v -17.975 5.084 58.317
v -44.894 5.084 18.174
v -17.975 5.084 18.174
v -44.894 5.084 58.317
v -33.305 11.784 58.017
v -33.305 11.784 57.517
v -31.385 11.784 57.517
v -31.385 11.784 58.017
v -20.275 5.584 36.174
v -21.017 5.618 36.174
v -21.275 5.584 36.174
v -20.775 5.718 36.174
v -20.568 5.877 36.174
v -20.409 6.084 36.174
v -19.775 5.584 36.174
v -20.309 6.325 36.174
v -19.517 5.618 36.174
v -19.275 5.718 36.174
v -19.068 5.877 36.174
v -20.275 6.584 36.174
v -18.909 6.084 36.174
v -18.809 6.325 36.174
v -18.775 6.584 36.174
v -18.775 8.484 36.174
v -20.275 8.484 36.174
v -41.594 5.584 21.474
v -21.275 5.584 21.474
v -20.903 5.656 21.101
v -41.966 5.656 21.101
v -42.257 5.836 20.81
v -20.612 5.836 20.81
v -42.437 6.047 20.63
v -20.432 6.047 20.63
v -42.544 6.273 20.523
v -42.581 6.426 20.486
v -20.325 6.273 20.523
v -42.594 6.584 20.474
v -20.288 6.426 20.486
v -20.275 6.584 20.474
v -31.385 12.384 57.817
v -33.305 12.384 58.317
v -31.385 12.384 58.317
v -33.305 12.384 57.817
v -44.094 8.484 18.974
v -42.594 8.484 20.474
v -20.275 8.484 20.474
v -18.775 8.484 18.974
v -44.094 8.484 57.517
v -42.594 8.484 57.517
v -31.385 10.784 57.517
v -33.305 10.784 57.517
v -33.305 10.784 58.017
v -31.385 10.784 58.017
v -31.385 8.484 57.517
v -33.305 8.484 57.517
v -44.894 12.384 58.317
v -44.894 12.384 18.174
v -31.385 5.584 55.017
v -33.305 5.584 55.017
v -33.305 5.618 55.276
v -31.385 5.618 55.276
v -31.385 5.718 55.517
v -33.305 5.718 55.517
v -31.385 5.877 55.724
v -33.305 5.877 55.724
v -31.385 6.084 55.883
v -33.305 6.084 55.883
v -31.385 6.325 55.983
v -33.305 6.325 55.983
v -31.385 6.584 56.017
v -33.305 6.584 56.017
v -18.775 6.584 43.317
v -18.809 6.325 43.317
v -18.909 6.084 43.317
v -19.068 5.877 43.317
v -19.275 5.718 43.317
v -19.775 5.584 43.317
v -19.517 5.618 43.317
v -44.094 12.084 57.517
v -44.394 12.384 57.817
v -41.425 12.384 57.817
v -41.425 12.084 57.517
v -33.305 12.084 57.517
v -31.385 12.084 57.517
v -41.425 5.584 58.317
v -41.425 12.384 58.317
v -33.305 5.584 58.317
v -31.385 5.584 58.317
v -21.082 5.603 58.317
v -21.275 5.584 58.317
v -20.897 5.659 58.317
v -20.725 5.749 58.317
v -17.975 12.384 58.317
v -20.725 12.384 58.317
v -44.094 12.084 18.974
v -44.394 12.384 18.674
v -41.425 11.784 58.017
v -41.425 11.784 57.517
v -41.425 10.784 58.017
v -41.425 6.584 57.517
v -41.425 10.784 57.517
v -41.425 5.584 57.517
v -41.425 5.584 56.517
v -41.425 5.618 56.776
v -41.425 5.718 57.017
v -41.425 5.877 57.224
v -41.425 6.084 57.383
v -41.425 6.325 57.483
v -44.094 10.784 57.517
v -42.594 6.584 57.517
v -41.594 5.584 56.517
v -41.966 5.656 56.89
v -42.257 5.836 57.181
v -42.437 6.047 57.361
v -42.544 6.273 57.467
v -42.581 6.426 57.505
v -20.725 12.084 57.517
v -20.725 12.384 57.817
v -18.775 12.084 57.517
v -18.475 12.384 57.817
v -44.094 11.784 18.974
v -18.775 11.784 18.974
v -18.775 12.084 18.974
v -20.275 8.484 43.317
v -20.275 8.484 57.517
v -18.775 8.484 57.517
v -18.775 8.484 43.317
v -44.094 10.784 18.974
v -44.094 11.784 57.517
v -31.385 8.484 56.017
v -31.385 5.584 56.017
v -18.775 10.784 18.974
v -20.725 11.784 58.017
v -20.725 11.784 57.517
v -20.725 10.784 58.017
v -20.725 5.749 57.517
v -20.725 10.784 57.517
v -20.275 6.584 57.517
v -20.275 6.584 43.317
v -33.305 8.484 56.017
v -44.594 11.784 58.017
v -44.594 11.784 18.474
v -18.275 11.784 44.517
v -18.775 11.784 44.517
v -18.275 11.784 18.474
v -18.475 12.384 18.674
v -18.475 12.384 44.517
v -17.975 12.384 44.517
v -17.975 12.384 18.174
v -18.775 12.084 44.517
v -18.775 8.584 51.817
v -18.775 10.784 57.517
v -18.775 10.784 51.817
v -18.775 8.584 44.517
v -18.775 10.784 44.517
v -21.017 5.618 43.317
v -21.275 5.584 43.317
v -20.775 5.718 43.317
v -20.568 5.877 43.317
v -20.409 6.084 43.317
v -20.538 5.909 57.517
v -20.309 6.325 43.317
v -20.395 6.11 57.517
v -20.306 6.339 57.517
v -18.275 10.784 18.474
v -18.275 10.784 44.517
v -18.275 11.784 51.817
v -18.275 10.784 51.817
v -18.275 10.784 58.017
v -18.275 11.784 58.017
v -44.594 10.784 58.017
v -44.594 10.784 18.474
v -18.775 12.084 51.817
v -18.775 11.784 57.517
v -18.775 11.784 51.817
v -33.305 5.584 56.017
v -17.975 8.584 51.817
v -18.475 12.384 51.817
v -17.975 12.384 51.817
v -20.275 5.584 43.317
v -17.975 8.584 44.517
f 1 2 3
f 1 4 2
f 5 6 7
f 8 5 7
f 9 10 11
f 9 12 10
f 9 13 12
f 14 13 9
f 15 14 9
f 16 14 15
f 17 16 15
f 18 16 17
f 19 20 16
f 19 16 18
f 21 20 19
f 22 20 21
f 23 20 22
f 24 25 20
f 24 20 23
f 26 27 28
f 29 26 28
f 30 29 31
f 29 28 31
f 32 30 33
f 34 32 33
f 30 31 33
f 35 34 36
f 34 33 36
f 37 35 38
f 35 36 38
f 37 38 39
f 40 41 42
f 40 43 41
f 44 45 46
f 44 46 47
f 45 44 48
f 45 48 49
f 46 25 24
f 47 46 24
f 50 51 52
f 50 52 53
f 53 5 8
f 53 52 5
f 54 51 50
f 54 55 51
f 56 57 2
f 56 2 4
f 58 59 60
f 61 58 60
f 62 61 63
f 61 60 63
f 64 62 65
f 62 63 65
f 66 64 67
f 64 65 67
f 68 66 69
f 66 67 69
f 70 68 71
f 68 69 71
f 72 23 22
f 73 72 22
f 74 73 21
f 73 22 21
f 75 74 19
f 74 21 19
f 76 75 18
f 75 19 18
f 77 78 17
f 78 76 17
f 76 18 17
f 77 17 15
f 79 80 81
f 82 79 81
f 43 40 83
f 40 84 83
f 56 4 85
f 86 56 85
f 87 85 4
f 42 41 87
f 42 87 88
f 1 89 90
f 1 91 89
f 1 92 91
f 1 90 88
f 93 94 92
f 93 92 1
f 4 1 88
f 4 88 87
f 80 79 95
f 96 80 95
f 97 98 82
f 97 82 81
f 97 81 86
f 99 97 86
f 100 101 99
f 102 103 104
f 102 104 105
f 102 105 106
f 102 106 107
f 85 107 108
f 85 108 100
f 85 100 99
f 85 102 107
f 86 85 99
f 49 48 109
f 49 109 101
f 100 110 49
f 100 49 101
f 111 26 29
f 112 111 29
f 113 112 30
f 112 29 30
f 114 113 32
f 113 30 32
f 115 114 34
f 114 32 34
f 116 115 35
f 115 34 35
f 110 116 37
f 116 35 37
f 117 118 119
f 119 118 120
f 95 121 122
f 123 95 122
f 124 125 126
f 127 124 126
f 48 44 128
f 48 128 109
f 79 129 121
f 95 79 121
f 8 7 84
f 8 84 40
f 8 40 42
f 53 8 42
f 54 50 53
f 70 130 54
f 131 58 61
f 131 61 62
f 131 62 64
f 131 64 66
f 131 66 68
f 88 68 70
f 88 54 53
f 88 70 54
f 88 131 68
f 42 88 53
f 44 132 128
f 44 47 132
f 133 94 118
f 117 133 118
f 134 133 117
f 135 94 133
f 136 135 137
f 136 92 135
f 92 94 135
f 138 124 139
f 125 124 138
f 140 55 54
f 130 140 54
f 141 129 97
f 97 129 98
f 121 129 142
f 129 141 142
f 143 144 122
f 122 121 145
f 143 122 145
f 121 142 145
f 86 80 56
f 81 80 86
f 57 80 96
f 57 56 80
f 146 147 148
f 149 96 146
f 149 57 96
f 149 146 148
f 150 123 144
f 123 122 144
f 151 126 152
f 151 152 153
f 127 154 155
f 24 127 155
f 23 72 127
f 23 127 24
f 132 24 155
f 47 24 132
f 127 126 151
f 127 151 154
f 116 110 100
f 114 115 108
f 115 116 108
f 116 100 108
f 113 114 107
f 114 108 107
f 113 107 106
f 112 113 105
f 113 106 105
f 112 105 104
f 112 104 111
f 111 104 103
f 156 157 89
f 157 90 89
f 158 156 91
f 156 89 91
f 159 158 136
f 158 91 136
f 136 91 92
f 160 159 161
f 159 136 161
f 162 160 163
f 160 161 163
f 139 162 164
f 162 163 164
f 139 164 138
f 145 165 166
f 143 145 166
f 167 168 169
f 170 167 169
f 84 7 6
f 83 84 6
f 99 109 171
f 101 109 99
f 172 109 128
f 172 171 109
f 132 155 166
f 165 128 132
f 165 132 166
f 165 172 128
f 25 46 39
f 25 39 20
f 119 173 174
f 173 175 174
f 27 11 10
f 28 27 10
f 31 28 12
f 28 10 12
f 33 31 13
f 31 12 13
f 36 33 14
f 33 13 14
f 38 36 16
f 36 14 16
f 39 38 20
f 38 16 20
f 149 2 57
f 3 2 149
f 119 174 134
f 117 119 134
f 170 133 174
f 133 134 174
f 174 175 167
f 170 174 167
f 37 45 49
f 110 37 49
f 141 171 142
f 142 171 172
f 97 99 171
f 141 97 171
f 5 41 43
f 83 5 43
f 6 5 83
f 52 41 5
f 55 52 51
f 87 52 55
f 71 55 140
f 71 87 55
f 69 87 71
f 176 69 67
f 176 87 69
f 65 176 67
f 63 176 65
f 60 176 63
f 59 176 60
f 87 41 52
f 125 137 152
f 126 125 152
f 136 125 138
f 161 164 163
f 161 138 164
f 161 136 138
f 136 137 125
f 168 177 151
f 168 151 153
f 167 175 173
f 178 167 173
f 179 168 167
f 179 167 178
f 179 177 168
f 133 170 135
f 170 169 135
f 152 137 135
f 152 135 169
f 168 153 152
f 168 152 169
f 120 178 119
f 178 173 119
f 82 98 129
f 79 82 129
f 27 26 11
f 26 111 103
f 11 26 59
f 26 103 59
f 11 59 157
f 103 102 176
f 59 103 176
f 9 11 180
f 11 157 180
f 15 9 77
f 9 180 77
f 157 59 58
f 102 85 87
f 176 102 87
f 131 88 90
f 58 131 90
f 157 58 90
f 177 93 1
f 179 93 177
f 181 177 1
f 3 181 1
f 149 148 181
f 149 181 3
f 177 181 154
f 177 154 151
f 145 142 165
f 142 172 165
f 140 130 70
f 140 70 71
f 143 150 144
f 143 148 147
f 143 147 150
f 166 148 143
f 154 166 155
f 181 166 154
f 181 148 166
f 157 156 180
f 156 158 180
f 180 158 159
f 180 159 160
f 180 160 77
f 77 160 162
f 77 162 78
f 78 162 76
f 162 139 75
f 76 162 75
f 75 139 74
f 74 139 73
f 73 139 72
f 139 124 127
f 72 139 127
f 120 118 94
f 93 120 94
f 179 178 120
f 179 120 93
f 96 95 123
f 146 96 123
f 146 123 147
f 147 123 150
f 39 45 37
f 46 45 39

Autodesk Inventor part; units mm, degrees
ref_plane "YZ Plane" through (0, 0, 0) normal (1, 0, 0) x (0, 1, 0)
ref_plane "Work Plane1" through (-26.0554, 5.5841, 57.3172) normal (0, -1, 0) x (1, 0, 0)
sketch "Sketch1" plane through (-26.0554, 5.5841, 57.3172) normal (0, -1, 0) x (1, 0, 0)
  arc A0 (-6.2529, -16.6318) -> (-5.7152, -17.8896) centre (-4.5084, -16.63) ccw projected
  line L0 (-6.2529, -16.6318) -> (-8.9554, -15.4715) projected
  arc A1 (-8.9554, -15.4715) -> (-9.6085, -15.4715) centre (-9.2819, -16.2321) ccw projected
  line L1 (-9.6085, -15.4715) -> (-11.5974, -15.1528) projected
  arc A2 (-11.5974, -15.1528) -> (-12.113, -13.8772) centre (-12.9119, -14.9421) ccw projected
  line L2 (-12.113, -13.8772) -> (-12.113, -11.7599) projected
  line L3 (-12.113, -11.7599) -> (-10.8096, -8.0503) projected
  line L4 (-10.8096, -8.0503) -> (-0.9192, -8.5103) projected
  arc A3 (-0.3314, -8.8426) -> (-0.9192, -8.5103) centre (-0.954, -9.258) ccw projected
  line L5 (-0.3314, -8.8426) -> (2.5309, -17.8896) projected
  arc A4 (2.5309, -18.6308) -> (2.5309, -17.8896) centre (1.3597, -18.2602) ccw projected
  line L6 (2.5309, -18.6308) -> (1.3597, -25.9399) projected
  line L7 (1.3597, -25.9399) -> (-2.6315, -30.1057) projected
  arc A5 (-3.5771, -30.3612) -> (-2.6315, -30.1057) centre (-3.3161, -29.4497) ccw projected
  line L8 (-3.5771, -30.3612) -> (-8.4584, -28.2656) projected
  arc A6 (-9.8385, -26.6044) -> (-8.4584, -28.2656) centre (-7.5216, -26.0835) ccw projected
  line L9 (-9.8385, -26.6044) -> (-9.8385, -22.4387) projected
  arc A7 (-9.6085, -21.9531) -> (-9.8385, -22.4387) centre (-9.2109, -22.4387) ccw projected
  line L10 (-9.6085, -21.9531) -> (-5.7152, -17.8896) projected
  line L11 (7.08, -38.1436) -> (-17.82, -38.1436) projected
  line L12 (7.08, 0) -> (7.08, -38.1436) projected
  line L13 (-17.12, 0) -> (7.08, 0) projected
  line L14 (-17.82, -38.1436) -> (-17.12, 0) projected
  line L15 (-15.12, 0) -> (-15.12, -2.1) projected
  line L16 (4.83, 0) -> (4.83, -2.3) projected
  line L17 (-7.5, -2.1) -> (-7.5, 0) projected
  line L18 (-5.08, 0) -> (-5.08, -2.1) projected
  line L19 (8.08, -39.1436) -> (-18.8385, -39.1436)
  line L20 (-18.8385, -39.1436) -> (-18.1018, 1)
  line L21 (-18.1018, 1) -> (8.08, 1)
  line L22 (8.08, 1) -> (8.08, -39.1436)
  line L23 (-18.8385, -39.1436) -> (-18.8385, 1)
  line L24 (-18.8385, 1) -> (-18.1018, 1)
  point P0 (26.0554, -57.3172)
  dimension "d2" = 1
extrude "Extrusion1" add sketch "Sketch1" along normal blind 0.5 contours L0 A1 L1 A2 L2 L3 L4 A3 L5 A4 L6 L7 A5 L8 A6 L9 A7 L10 A0 | L11 L14 L13 L12 | L19 L20 L21 L22 | L23 L24 L20
sketch "Sketch2" plane through (-26.0554, 5.5841, 57.3172) normal (0, 1, 0) x (1, 0, 0)
  line L0 (5.08, 0) -> (5.08, 2.1)
  line L1 (5.08, 2.1) -> (5.08, 0)
  line L2 (-5.08, 0) -> (-5.08, 2.1)
  line L3 (-7.5, 2.1) -> (-7.5, 0)
  line L4 (-15.12, 0) -> (-15.12, 2.1)
  line L5 (4.83, 2.3) -> (2.79, 2.3)
  line L6 (8.08, 39.1436) -> (8.08, -1)
  line L7 (-18.8385, 39.1436) -> (8.08, 39.1436)
  line L8 (5.08, 2.1) -> (5.08, 2.3)
  line L9 (5.08, 2.3) -> (4.83, 2.3)
  line L10 (2.79, 2.3) -> (-5.08, 2.3)
  line L11 (-5.08, 2.3) -> (-5.08, 2.0628)
  line L12 (-7.5, 2.1) -> (-7.5, 2.3)
  line L13 (-7.5, 2.3) -> (-15.12, 2.3)
  line L14 (-15.12, 2.3) -> (-15.12, 2.0628)
  line L15 (-7.5, 0) -> (-15.12, 0)
  line L16 (-5.08, 0) -> (5.08, 0)
  line L17 (8.08, -1) -> (-17.1109, -1)
  line L18 (-7.25, 2.55) -> (-15.37, 2.55)
  line L19 (-15.37, 2.55) -> (-15.37, -1)
  line L20 (-15.37, -1) -> (-7.25, -1)
  line L21 (-7.25, -1) -> (-7.25, 2.55)
  line L22 (-5.33, -1) -> (5.33, -1)
  line L23 (5.33, -1) -> (5.33, 2.55)
  line L24 (5.33, 2.55) -> (-5.33, 2.55)
  line L25 (-5.33, 2.55) -> (-5.33, -1)
  line L26 (8.08, -1) -> (-18.8385, -1)
  line L27 (-18.8385, -1) -> (-18.8385, 39.1436)
  line L28 (7.28, -0.2) -> (7.28, 38.3436)
  line L29 (7.28, 38.3436) -> (-18.0385, 38.3436)
  line L30 (-18.0385, 38.3436) -> (-18.0385, -0.2)
  line L31 (-18.0385, -0.2) -> (7.28, -0.2)
  point P0 (26.0554, 57.3172)
  point P1 (-5.33, -0.2)
  point P2 (-7.25, -0.2)
  point P3 (-7.25, -1)
  point P4 (-17.6109, -0.5)
  point P5 (-15.37, -0.2)
  point P6 (5.33, -0.2)
  point P7 (5.33, -1)
  point P8 (-17.1109, -1)
extrude "Extrusion2" add sketch "Sketch2" along normal blind 5.2 contours L6 L17 L23 L31 L28 L29 L30 L19 L26 L27 L7 | L17 L21 L31 L25
sketch "Sketch3" plane through (-17.9754, 5.0841, 58.3172) normal (1, 0, 0) x (0, 0, -1)
  line L0 (6.5, 4) -> (13.3, 4)
  line L1 (6.5, 7.65) -> (13.8, 7.65)
  line L2 (13.8, 7.65) -> (13.8, 3.5)
  line L3 (13.8, 3.5) -> (6.5, 3.5)
  line L4 (6.5, 3.5) -> (6.5, 7.65)
  line L5 (1, 3.4) -> (39.1436, 3.4) projected
  line L6 (39.1436, 3.4) -> (39.1436, 4) projected
  line L7 (13.3, 4) -> (39.1436, 4) projected
  line L8 (13.3, 4) -> (13.3, 7.15) projected
  line L9 (7, 7.15) -> (13.3, 7.15) projected
  line L10 (7, 4) -> (7, 7.15) projected
  line L11 (1, 4) -> (7, 4) projected
  line L12 (1, 3.4) -> (1, 4) projected
  point P0 (58.3172, -5.0841)
  dimension "d14" = 0.5
  dimension "d41" = 0.5
  dimension "d42" = 0.5
  dimension "d43" = 0.5
extrude "Extrusion3" cut sketch "Sketch3" against normal blind 5.2 contours L4 L1 L2 L7 L8 L9 L10 L0 | L0 L7 L2 L3 L4 | L10 L9 L8 L0
sketch "Sketch4" plane through (-26.0554, 10.7841, 57.3172) normal (0, 1, 0) x (1, 0, 0)
  line L0 (8.08, 5.5) -> (7.28, 5.5) projected
  line L1 (7.28, 5.5) -> (7.28, -0.2) projected
  line L2 (7.28, -0.2) -> (5.33, -0.2) projected
  line L3 (5.33, -0.2) -> (5.33, -1) projected
  line L4 (5.33, -1) -> (8.08, -1) projected
  line L5 (8.08, -1) -> (8.08, 5.5) projected
  line L6 (7.28, 12.8) -> (8.08, 12.8) projected
  line L7 (8.08, 12.8) -> (8.08, 39.1436) projected
  line L8 (8.08, 39.1436) -> (-18.8385, 39.1436) projected
  line L9 (-18.8385, 39.1436) -> (-18.8385, -1) projected
  line L10 (-18.8385, -1) -> (-15.37, -1) projected
  line L11 (-15.37, -1) -> (-15.37, -0.2) projected
  line L12 (-15.37, -0.2) -> (-18.0385, -0.2) projected
  line L13 (-18.0385, -0.2) -> (-18.0385, 38.3436) projected
  line L14 (-18.0385, 38.3436) -> (7.28, 38.3436) projected
  line L15 (7.28, 38.3436) -> (7.28, 12.8) projected
  line L16 (-7.25, -0.2) -> (-7.25, -1) projected
  line L17 (-7.25, -1) -> (-5.33, -1) projected
  line L18 (-5.33, -1) -> (-5.33, -0.2) projected
  line L19 (-5.33, -0.2) -> (-7.25, -0.2) projected
  line L20 (-15.37, -0.2) -> (-15.37, -1) projected
  line L21 (-15.37, -0.7) -> (-18.5385, -0.7)
  line L22 (-18.5385, -0.7) -> (-18.5385, 38.8436)
  line L23 (-18.5385, 38.8436) -> (7.78, 38.8436)
  line L24 (7.78, 38.8436) -> (7.78, 12.8)
  line L25 (7.78, 5.5) -> (7.78, -0.7)
  line L26 (7.78, -0.7) -> (5.33, -0.7)
  line L27 (-7.25, -0.7) -> (-5.33, -0.7)
  point P0 (8.08, 25.9718)
  point P1 (-15.37, -0.7)
  dimension "d44" = 0.3
  dimension "d45" = 0.3
  dimension "d46" = 0.3
  dimension "d47" = 0.3
  dimension "d48" = 0.3
  dimension "d49" = 0.3
extrude "Extrusion4" add sketch "Sketch4" along normal blind 1 contours L5 L4 L3 L26 L25 L0 | L24 L23 L22 L21 L11 L10 L9 L8 L7 L6 | L27 L18 L17 L16
sketch "Sketch5" plane through (-26.0554, 11.7841, 57.3172) normal (0, 1, 0) x (1, 0, 0)
  line L0 (-15.37, -1) -> (-15.37, -0.2) projected
  line L1 (8.08, 12.8) -> (8.08, 39.1436) projected
  line L2 (8.08, 39.1436) -> (-18.8385, 39.1436) projected
  line L3 (-18.8385, 39.1436) -> (-18.8385, -1) projected
  line L4 (-18.8385, -1) -> (-15.37, -1) projected
  line L5 (7.58, 5.5) -> (7.38, 5.5) projected
  line L6 (7.38, 5.5) -> (7.38, -0.3) projected
  line L7 (7.38, -0.3) -> (5.33, -0.3) projected
  line L8 (5.33, -0.3) -> (5.33, -0.5) projected
  line L9 (5.33, -0.5) -> (7.58, -0.5) projected
  line L10 (7.58, -0.5) -> (7.58, 5.5) projected
  line L11 (-7.25, -0.2) -> (-7.25, -1) projected
  line L12 (-7.25, -1) -> (-5.33, -1) projected
  line L13 (-15.37, -1) -> (-15.37, -0.2) projected
  line L14 (-15.37, -0.2) -> (-18.0385, -0.2) projected
  line L15 (-18.0385, -0.2) -> (-18.0385, 38.3436) projected
  line L16 (-18.0385, 38.3436) -> (7.28, 38.3436) projected
  line L17 (7.28, 38.3436) -> (7.28, 12.8) projected
  line L18 (-5.33, -0.2) -> (-7.25, -0.2) projected
  line L19 (-7.25, -0.2) -> (-7.25, -1) projected
  line L20 (7.28, 5.5) -> (7.28, -0.2) projected
  line L21 (7.28, -0.2) -> (5.33, -0.2) projected
  line L22 (-7.25, -0.2) -> (-7.25, -1) projected
  line L23 (-15.37, -1) -> (-15.37, -0.2) projected
  line L24 (-15.37, -0.2) -> (-18.0385, -0.2) projected
  line L25 (-18.0385, -0.2) -> (-18.0385, 38.3436) projected
  line L26 (-18.0385, 38.3436) -> (7.28, 38.3436) projected
  line L27 (-15.37, -1) -> (-15.37, -0.2) projected
  line L28 (-15.37, -0.2) -> (-18.0385, -0.2) projected
  line L29 (-18.0385, -0.2) -> (-18.0385, 38.3436) projected
  line L30 (-18.0385, 38.3436) -> (7.28, 38.3436) projected
  line L31 (7.28, 38.3436) -> (7.28, 12.8) projected
  line L32 (-7.25, -0.2) -> (-7.25, -1) projected
  line L33 (7.28, -0.2) -> (5.33, -0.2) projected
  line L34 (7.28, 12.8) -> (8.08, 12.8) projected
  line L35 (8.08, 12.8) -> (8.08, 39.1436) projected
  line L36 (8.08, 39.1436) -> (-18.8385, 39.1436) projected
  line L37 (-18.8385, 39.1436) -> (-18.8385, -1) projected
  line L38 (-18.8385, -1) -> (-15.37, -1) projected
  line L39 (8.08, -1) -> (8.08, 5.5) projected
  line L40 (8.08, 5.5) -> (7.28, 5.5) projected
  line L41 (7.28, 38.3436) -> (7.28, 12.8) projected
  line L42 (7.28, 12.8) -> (8.08, 12.8) projected
  line L43 (8.08, 12.8) -> (8.08, 39.1436) projected
  line L44 (8.08, 39.1436) -> (-18.8385, 39.1436) projected
  line L45 (-18.8385, 39.1436) -> (-18.8385, -1) projected
  line L46 (-18.8385, -1) -> (-15.37, -1) projected
  line L47 (8.08, -1) -> (8.08, 5.5) projected
  line L48 (8.08, 5.5) -> (7.28, 5.5) projected
  line L49 (7.28, 5.5) -> (7.28, -0.2) projected
  line L50 (7.28, 12.8) -> (8.08, 12.8) projected
  line L51 (8.08, 12.8) -> (8.08, 39.1436) projected
  line L52 (8.08, 39.1436) -> (-18.8385, 39.1436) projected
  line L53 (-18.8385, 39.1436) -> (-18.8385, -1) projected
  line L54 (-18.8385, -1) -> (-15.37, -1) projected
  line L55 (8.08, -1) -> (8.08, 5.5) projected
  line L56 (8.08, 5.5) -> (7.28, 5.5) projected
  line L57 (7.28, 5.5) -> (7.28, -0.2) projected
  line L58 (8.08, -1) -> (8.08, 5.5) projected
  line L59 (8.08, 5.5) -> (7.28, 5.5) projected
  line L60 (7.28, 5.5) -> (7.28, -0.2) projected
  line L61 (-5.33, -0.2) -> (-7.25, -0.2) projected
  line L62 (-7.25, -1) -> (-5.33, -1) projected
  line L63 (-5.33, -1) -> (-5.33, -0.2) projected
  line L64 (-5.33, -0.2) -> (-7.25, -0.2) projected
  line L65 (5.33, -0.2) -> (5.33, -1) projected
  line L66 (5.33, -1) -> (8.08, -1) projected
  line L67 (-7.25, -1) -> (-5.33, -1) projected
  line L68 (-5.33, -1) -> (-5.33, -0.2) projected
  line L69 (7.28, -0.2) -> (5.33, -0.2) projected
  line L70 (5.33, -0.2) -> (5.33, -1) projected
  line L71 (5.33, -1) -> (8.08, -1) projected
  line L72 (-7.25, -1) -> (-5.33, -1) projected
  line L73 (-5.33, -1) -> (-5.33, -0.2) projected
  line L74 (-5.33, -0.2) -> (-7.25, -0.2) projected
  line L75 (5.33, -0.2) -> (5.33, -1) projected
  line L76 (5.33, -1) -> (8.08, -1) projected
  line L77 (-5.33, -1) -> (-5.33, -0.2) projected
  line L78 (7.28, -0.2) -> (5.33, -0.2) projected
  line L79 (5.33, -0.2) -> (5.33, -1) projected
  line L80 (5.33, -1) -> (8.08, -1) projected
  line L81 (-15.37, -0.2) -> (-18.0385, -0.2) projected
  line L82 (-18.0385, -0.2) -> (-18.0385, 38.3436) projected
  line L83 (-18.0385, 38.3436) -> (7.28, 38.3436) projected
  line L84 (7.28, 38.3436) -> (7.28, 12.8) projected
  line L85 (7.28, 12.8) -> (8.08, 12.8) projected
  point P0 (26.0554, 57.3172)
extrude "Extrusion5" add sketch "Sketch5" along normal blind 0.6
chamfer "Chamfer1" distance 0.3 angle 45 7 edges at (-42.7597, 12.3841, 57.5172) (-44.0939, 12.3841, 38.2454) (-31.4347, 12.3841, 18.9736) (-18.7754, 12.3841, 31.7454) (-32.3454, 12.3841, 57.5172) (-18.7754, 12.3841, 54.6672) (-19.7504, 12.3841, 57.5172)
ref_plane "Work Plane2" through (-31.4254, 8.4841, 38.2454) normal (0, -1, 0) x (1, 0, 0)
sketch "Sketch6" plane through (-31.4254, 8.4841, 38.2454) normal (0, -1, 0) x (1, 0, 0)
  line L0 (-10, 19.2718) -> (-10, 20.0718) projected
  line L1 (-1.88, 20.0718) -> (-10, 20.0718) projected
  line L2 (-1.88, 20.0718) -> (-1.88, 19.2718) projected
  line L3 (-1.88, 19.2718) -> (0.04, 19.2718) projected
  line L4 (0.04, 19.2718) -> (0.04, 20.0718) projected
  line L5 (10.7, 20.0718) -> (0.04, 20.0718) projected
  line L6 (10.7, 20.0718) -> (10.7, 19.2718) projected
  line L7 (10.7, 19.2718) -> (12.65, 19.2718) projected
  line L8 (12.65, 19.2718) -> (12.65, -19.2718) projected
  line L9 (12.65, -19.2718) -> (-12.6685, -19.2718) projected
  line L10 (-12.6685, -19.2718) -> (-12.6685, 19.2718) projected
  line L11 (-12.6685, 19.2718) -> (-10, 19.2718) projected
  line L12 (-11.1685, -17.7718) -> (11.15, -17.7718)
  line L13 (11.15, -17.7718) -> (11.15, 17.7718)
  line L14 (11.15, 17.7718) -> (9.2, 17.7718)
  line L15 (9.2, 17.7718) -> (9.2, 18.5718)
  line L16 (9.2, 18.5718) -> (1.54, 18.5718)
  line L17 (1.54, 18.5718) -> (1.54, 17.7718)
  line L18 (1.54, 17.7718) -> (-3.38, 17.7718)
  line L19 (-3.38, 17.7718) -> (-3.38, 18.5718)
  line L20 (-3.38, 18.5718) -> (-8.5, 18.5718)
  line L21 (-8.5, 18.5718) -> (-8.5, 17.7718)
  line L22 (-8.5, 17.7718) -> (-11.1685, 17.7718)
  line L23 (-11.1685, 17.7718) -> (-11.1685, -17.7718)
  line L24 (-11.1685, 17.7718) -> (-11.1685, 19.2718)
  line L25 (11.15, 17.7718) -> (11.15, 19.2718)
  line L26 (-1.88, 19.2718) -> (-1.88, 17.7718)
  line L27 (0.04, 19.2718) -> (0.04, 17.7718)
  line L28 (11.15, -2.0718) -> (12.65, -2.0718)
  line L29 (12.65, -19.2718) -> (12.65, 6.2718) projected
  line L30 (11.15, 5.0718) -> (12.65, 5.0718)
  point P0 (31.4254, -38.2454)
  point P1 (12.45, 19.0718)
  point P2 (12.45, -19.0718)
  point P3 (12.65, 5.0718)
  point P4 (12.65, -2.0718)
  dimension "d50" = 1.5
  dimension "d51" = 17
  dimension "d52" = 14
extrude "Extrusion6" add sketch "Sketch6" along normal up to surface (2.9 mm away) contours L24 L23 L12 L13 L28 L8 L9 L10 L11 | L3 L27 L18 L26 | L30 L13 L25 L7 L8
fillet "Fillet2" radius 1 7 edges at (-42.5939, 5.5841, 38.9954) (-42.0097, 5.5841, 57.5172) (-32.3454, 5.5841, 56.0172) (-20.2754, 5.5841, 50.4172) (-18.7754, 5.5841, 39.7454) (-20.2754, 5.5841, 28.3236) (-31.4347, 5.5841, 20.4736)
equation "\"d45\" = d44"
equation "\"d46\" = d44"
equation "\"d47\" = d44"
equation "\"d48\" = d44"
equation "\"d49\" = d44"
properties part number "case"
